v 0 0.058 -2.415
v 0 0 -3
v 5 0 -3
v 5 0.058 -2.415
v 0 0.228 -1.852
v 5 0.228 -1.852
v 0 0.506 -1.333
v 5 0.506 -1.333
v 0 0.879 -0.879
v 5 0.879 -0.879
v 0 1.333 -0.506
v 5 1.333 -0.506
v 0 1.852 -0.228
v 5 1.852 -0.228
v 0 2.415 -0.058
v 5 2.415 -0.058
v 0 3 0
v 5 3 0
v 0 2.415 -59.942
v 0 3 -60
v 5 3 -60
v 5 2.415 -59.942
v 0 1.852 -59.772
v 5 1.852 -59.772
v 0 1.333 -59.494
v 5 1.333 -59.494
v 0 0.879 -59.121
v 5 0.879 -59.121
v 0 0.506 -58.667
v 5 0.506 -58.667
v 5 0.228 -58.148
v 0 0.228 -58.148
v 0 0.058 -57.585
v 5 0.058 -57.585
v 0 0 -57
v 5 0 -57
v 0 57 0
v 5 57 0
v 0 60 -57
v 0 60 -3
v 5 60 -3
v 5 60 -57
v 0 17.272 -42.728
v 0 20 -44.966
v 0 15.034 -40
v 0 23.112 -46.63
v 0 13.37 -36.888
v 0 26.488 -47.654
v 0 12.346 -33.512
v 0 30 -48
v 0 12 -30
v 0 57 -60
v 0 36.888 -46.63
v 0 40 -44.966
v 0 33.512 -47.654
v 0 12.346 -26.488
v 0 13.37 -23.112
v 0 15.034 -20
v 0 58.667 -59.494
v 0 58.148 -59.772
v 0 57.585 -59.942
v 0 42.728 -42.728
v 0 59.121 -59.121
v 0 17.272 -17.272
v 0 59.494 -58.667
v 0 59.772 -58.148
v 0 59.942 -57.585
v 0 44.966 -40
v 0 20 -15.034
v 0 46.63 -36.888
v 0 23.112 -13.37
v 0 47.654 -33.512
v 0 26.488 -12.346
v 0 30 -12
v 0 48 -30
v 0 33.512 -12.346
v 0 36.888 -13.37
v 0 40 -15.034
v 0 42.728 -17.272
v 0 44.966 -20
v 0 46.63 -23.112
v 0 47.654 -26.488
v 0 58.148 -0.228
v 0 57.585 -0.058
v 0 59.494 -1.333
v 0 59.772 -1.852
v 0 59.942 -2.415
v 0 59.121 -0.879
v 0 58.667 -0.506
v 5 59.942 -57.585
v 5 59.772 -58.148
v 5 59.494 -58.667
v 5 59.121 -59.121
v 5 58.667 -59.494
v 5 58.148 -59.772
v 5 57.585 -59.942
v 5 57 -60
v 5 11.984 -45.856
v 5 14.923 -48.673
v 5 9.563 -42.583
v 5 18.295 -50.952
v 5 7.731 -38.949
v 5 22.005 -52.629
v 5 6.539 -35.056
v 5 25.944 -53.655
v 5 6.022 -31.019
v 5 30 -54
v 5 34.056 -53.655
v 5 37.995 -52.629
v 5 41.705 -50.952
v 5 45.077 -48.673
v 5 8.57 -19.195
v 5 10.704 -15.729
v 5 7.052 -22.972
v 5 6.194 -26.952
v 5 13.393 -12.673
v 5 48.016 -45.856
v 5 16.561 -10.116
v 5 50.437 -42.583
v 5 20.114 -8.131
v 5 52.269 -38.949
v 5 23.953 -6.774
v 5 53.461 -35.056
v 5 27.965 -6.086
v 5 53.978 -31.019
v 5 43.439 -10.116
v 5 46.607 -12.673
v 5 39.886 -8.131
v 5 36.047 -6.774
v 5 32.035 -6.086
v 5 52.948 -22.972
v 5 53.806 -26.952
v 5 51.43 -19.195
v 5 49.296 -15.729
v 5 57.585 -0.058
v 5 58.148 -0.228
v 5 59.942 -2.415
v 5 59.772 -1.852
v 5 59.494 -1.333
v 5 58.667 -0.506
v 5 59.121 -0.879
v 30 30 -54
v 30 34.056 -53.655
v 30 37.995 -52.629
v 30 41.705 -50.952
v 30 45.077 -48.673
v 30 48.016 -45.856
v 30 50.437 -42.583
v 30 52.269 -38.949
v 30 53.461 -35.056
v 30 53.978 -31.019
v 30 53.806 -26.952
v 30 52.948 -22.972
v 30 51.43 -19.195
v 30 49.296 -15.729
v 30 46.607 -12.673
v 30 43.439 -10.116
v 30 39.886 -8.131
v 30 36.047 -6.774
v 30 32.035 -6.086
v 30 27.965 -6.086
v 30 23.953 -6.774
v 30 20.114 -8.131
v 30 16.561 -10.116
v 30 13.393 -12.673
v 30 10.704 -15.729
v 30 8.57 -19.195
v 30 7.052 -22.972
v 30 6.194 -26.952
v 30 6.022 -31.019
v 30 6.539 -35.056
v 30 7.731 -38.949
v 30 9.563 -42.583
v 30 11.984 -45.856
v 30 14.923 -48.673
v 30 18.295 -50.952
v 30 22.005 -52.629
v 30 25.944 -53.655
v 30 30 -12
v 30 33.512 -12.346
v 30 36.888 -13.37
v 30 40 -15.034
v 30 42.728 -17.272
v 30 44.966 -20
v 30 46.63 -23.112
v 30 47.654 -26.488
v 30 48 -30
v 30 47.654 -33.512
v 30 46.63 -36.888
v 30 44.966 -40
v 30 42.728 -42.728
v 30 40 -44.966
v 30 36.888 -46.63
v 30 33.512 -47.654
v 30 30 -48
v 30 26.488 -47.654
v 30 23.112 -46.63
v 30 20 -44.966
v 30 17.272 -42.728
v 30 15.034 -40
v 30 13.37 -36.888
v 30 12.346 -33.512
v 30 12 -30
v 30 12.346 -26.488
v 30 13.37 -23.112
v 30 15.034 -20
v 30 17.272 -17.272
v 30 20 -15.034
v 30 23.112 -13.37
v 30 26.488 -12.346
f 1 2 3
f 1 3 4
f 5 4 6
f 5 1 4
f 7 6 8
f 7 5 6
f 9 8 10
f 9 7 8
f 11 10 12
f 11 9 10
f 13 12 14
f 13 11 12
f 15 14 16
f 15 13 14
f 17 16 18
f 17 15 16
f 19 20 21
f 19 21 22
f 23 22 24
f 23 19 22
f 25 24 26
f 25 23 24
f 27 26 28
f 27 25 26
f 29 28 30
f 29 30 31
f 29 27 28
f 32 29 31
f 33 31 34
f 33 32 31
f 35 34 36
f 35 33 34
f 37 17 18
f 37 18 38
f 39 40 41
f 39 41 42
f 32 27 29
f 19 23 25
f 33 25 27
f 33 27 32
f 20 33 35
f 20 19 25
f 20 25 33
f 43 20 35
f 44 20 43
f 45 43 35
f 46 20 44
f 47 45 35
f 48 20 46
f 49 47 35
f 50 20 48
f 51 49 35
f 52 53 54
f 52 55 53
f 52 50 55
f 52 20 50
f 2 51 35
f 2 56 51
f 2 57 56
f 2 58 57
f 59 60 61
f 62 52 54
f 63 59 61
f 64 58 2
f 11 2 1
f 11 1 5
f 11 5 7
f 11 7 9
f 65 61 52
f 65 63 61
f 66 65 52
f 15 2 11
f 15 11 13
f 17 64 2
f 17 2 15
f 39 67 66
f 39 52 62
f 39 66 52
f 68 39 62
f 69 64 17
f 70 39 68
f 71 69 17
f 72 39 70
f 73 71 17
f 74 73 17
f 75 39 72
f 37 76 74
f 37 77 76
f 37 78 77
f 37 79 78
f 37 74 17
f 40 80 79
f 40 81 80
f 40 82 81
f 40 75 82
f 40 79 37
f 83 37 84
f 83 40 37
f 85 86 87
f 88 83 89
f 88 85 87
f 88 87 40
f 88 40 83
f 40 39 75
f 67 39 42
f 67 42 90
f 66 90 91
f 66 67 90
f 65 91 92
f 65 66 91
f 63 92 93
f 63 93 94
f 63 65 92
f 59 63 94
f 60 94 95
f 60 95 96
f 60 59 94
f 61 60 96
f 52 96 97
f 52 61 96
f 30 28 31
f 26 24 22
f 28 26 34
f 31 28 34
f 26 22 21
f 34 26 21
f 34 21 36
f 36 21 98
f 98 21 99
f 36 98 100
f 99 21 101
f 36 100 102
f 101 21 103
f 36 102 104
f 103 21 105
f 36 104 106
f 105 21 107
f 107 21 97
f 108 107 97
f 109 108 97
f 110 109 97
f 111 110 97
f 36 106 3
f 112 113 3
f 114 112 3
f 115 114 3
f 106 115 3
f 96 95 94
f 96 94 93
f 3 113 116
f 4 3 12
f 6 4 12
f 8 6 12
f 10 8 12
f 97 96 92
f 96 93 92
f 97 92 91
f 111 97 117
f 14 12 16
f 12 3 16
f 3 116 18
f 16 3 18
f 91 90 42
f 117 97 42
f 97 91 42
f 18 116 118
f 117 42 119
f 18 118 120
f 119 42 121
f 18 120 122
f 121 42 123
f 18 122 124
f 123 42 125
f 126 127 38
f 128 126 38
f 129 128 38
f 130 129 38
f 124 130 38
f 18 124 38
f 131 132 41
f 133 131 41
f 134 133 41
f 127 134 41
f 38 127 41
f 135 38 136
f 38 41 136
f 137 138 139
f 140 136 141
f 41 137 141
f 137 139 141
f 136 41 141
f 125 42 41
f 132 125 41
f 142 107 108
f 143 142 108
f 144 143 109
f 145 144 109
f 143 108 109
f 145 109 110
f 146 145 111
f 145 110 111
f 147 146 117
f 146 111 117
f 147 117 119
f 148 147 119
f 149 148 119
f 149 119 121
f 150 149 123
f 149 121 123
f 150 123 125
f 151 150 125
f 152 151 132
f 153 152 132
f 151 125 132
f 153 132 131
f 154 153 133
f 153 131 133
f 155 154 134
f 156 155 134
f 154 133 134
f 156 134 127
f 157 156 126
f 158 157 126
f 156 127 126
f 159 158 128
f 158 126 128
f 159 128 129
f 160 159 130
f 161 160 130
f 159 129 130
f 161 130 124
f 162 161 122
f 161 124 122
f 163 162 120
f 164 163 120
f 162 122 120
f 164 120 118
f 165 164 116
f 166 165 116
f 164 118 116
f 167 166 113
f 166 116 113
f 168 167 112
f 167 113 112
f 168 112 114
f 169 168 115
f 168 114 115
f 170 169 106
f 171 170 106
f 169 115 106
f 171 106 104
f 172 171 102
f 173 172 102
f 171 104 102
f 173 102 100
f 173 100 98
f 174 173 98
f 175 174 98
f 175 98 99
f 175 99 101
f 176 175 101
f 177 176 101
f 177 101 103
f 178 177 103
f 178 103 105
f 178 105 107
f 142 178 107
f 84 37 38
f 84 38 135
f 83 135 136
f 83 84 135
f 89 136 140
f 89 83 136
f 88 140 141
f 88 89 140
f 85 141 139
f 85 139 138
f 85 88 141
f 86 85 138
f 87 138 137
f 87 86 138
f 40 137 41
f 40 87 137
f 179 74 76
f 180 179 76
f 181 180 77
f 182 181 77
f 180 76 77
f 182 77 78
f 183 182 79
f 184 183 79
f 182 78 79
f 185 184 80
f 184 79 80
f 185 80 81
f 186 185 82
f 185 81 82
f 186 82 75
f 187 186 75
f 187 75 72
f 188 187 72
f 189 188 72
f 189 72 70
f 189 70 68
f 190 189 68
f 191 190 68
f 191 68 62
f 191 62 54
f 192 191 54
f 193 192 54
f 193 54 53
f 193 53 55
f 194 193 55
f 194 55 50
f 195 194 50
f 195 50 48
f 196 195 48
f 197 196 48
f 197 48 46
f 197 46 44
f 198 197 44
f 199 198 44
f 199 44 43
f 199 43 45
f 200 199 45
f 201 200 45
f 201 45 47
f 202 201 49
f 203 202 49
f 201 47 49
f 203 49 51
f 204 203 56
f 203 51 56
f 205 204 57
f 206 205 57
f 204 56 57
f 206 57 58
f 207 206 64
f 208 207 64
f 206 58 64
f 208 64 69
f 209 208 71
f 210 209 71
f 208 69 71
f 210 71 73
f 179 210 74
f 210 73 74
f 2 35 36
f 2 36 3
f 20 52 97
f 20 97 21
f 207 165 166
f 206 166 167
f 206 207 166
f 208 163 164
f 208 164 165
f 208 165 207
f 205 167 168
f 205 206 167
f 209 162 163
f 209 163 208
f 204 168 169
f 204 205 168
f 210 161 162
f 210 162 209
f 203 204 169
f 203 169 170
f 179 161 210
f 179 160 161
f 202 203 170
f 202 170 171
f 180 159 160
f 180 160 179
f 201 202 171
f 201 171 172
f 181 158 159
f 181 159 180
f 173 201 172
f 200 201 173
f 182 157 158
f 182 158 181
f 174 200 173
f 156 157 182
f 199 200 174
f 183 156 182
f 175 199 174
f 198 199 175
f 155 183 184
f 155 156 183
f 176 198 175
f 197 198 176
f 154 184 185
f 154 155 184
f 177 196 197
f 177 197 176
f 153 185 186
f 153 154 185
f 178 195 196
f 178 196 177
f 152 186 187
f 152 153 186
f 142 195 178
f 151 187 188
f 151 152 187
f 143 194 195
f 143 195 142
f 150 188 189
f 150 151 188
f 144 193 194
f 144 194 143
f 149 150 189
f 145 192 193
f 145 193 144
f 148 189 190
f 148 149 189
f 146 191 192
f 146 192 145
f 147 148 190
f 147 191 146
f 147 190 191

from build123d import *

# Parameters (mm, degrees)
DODANIE_WYCI_GNI_CIE1_DEPTH = 5
SZKIC3_R                    = 24
DODANIE_WYCI_GNI_CIE2_DEPTH = 25
OTW_R_36_0_36_1_D           = 36


with BuildPart() as part:
    # Szkic2 → Dodanie-wyciągnięcie1 (new body)
    with BuildSketch(Plane(origin=(0, 0, 0), x_dir=(0, 0, -1), z_dir=(1, 0, 0))):
        with BuildLine():
            ThreePointArc((0, 57), (0.878679656, 59.121320344), (3, 60))
            Line((3, 60), (57, 60))
            ThreePointArc((57, 60), (59.121320344, 59.121320344), (60, 57))
            Line((60, 57), (60, 3))
            ThreePointArc((60, 3), (59.121320344, 0.878679656), (57, 0))
            Line((57, 0), (3, 0))
            ThreePointArc((3, 0), (0.878679656, 0.878679656), (0, 3))
            Line((0, 3), (0, 57))
        make_face()
    extrude(amount=DODANIE_WYCI_GNI_CIE1_DEPTH)

    # Szkic3 → Dodanie-wyciągnięcie2 (add)
    with BuildSketch(Plane(origin=(5, 0, 0), x_dir=(0, 0, -1), z_dir=(1, 0, 0))):
        with Locations((30, 30)):
            Circle(SZKIC3_R)
    extrude(amount=DODANIE_WYCI_GNI_CIE2_DEPTH)

    # Otwór Ø36.0 (36)1 (through all)
    with Locations(Plane(origin=(30, 0, 0), x_dir=(0, 0, -1), z_dir=(1, 0, 0))):
        with Locations((30, 30)):
            Hole(OTW_R_36_0_36_1_D / 2)


solid = part.part
